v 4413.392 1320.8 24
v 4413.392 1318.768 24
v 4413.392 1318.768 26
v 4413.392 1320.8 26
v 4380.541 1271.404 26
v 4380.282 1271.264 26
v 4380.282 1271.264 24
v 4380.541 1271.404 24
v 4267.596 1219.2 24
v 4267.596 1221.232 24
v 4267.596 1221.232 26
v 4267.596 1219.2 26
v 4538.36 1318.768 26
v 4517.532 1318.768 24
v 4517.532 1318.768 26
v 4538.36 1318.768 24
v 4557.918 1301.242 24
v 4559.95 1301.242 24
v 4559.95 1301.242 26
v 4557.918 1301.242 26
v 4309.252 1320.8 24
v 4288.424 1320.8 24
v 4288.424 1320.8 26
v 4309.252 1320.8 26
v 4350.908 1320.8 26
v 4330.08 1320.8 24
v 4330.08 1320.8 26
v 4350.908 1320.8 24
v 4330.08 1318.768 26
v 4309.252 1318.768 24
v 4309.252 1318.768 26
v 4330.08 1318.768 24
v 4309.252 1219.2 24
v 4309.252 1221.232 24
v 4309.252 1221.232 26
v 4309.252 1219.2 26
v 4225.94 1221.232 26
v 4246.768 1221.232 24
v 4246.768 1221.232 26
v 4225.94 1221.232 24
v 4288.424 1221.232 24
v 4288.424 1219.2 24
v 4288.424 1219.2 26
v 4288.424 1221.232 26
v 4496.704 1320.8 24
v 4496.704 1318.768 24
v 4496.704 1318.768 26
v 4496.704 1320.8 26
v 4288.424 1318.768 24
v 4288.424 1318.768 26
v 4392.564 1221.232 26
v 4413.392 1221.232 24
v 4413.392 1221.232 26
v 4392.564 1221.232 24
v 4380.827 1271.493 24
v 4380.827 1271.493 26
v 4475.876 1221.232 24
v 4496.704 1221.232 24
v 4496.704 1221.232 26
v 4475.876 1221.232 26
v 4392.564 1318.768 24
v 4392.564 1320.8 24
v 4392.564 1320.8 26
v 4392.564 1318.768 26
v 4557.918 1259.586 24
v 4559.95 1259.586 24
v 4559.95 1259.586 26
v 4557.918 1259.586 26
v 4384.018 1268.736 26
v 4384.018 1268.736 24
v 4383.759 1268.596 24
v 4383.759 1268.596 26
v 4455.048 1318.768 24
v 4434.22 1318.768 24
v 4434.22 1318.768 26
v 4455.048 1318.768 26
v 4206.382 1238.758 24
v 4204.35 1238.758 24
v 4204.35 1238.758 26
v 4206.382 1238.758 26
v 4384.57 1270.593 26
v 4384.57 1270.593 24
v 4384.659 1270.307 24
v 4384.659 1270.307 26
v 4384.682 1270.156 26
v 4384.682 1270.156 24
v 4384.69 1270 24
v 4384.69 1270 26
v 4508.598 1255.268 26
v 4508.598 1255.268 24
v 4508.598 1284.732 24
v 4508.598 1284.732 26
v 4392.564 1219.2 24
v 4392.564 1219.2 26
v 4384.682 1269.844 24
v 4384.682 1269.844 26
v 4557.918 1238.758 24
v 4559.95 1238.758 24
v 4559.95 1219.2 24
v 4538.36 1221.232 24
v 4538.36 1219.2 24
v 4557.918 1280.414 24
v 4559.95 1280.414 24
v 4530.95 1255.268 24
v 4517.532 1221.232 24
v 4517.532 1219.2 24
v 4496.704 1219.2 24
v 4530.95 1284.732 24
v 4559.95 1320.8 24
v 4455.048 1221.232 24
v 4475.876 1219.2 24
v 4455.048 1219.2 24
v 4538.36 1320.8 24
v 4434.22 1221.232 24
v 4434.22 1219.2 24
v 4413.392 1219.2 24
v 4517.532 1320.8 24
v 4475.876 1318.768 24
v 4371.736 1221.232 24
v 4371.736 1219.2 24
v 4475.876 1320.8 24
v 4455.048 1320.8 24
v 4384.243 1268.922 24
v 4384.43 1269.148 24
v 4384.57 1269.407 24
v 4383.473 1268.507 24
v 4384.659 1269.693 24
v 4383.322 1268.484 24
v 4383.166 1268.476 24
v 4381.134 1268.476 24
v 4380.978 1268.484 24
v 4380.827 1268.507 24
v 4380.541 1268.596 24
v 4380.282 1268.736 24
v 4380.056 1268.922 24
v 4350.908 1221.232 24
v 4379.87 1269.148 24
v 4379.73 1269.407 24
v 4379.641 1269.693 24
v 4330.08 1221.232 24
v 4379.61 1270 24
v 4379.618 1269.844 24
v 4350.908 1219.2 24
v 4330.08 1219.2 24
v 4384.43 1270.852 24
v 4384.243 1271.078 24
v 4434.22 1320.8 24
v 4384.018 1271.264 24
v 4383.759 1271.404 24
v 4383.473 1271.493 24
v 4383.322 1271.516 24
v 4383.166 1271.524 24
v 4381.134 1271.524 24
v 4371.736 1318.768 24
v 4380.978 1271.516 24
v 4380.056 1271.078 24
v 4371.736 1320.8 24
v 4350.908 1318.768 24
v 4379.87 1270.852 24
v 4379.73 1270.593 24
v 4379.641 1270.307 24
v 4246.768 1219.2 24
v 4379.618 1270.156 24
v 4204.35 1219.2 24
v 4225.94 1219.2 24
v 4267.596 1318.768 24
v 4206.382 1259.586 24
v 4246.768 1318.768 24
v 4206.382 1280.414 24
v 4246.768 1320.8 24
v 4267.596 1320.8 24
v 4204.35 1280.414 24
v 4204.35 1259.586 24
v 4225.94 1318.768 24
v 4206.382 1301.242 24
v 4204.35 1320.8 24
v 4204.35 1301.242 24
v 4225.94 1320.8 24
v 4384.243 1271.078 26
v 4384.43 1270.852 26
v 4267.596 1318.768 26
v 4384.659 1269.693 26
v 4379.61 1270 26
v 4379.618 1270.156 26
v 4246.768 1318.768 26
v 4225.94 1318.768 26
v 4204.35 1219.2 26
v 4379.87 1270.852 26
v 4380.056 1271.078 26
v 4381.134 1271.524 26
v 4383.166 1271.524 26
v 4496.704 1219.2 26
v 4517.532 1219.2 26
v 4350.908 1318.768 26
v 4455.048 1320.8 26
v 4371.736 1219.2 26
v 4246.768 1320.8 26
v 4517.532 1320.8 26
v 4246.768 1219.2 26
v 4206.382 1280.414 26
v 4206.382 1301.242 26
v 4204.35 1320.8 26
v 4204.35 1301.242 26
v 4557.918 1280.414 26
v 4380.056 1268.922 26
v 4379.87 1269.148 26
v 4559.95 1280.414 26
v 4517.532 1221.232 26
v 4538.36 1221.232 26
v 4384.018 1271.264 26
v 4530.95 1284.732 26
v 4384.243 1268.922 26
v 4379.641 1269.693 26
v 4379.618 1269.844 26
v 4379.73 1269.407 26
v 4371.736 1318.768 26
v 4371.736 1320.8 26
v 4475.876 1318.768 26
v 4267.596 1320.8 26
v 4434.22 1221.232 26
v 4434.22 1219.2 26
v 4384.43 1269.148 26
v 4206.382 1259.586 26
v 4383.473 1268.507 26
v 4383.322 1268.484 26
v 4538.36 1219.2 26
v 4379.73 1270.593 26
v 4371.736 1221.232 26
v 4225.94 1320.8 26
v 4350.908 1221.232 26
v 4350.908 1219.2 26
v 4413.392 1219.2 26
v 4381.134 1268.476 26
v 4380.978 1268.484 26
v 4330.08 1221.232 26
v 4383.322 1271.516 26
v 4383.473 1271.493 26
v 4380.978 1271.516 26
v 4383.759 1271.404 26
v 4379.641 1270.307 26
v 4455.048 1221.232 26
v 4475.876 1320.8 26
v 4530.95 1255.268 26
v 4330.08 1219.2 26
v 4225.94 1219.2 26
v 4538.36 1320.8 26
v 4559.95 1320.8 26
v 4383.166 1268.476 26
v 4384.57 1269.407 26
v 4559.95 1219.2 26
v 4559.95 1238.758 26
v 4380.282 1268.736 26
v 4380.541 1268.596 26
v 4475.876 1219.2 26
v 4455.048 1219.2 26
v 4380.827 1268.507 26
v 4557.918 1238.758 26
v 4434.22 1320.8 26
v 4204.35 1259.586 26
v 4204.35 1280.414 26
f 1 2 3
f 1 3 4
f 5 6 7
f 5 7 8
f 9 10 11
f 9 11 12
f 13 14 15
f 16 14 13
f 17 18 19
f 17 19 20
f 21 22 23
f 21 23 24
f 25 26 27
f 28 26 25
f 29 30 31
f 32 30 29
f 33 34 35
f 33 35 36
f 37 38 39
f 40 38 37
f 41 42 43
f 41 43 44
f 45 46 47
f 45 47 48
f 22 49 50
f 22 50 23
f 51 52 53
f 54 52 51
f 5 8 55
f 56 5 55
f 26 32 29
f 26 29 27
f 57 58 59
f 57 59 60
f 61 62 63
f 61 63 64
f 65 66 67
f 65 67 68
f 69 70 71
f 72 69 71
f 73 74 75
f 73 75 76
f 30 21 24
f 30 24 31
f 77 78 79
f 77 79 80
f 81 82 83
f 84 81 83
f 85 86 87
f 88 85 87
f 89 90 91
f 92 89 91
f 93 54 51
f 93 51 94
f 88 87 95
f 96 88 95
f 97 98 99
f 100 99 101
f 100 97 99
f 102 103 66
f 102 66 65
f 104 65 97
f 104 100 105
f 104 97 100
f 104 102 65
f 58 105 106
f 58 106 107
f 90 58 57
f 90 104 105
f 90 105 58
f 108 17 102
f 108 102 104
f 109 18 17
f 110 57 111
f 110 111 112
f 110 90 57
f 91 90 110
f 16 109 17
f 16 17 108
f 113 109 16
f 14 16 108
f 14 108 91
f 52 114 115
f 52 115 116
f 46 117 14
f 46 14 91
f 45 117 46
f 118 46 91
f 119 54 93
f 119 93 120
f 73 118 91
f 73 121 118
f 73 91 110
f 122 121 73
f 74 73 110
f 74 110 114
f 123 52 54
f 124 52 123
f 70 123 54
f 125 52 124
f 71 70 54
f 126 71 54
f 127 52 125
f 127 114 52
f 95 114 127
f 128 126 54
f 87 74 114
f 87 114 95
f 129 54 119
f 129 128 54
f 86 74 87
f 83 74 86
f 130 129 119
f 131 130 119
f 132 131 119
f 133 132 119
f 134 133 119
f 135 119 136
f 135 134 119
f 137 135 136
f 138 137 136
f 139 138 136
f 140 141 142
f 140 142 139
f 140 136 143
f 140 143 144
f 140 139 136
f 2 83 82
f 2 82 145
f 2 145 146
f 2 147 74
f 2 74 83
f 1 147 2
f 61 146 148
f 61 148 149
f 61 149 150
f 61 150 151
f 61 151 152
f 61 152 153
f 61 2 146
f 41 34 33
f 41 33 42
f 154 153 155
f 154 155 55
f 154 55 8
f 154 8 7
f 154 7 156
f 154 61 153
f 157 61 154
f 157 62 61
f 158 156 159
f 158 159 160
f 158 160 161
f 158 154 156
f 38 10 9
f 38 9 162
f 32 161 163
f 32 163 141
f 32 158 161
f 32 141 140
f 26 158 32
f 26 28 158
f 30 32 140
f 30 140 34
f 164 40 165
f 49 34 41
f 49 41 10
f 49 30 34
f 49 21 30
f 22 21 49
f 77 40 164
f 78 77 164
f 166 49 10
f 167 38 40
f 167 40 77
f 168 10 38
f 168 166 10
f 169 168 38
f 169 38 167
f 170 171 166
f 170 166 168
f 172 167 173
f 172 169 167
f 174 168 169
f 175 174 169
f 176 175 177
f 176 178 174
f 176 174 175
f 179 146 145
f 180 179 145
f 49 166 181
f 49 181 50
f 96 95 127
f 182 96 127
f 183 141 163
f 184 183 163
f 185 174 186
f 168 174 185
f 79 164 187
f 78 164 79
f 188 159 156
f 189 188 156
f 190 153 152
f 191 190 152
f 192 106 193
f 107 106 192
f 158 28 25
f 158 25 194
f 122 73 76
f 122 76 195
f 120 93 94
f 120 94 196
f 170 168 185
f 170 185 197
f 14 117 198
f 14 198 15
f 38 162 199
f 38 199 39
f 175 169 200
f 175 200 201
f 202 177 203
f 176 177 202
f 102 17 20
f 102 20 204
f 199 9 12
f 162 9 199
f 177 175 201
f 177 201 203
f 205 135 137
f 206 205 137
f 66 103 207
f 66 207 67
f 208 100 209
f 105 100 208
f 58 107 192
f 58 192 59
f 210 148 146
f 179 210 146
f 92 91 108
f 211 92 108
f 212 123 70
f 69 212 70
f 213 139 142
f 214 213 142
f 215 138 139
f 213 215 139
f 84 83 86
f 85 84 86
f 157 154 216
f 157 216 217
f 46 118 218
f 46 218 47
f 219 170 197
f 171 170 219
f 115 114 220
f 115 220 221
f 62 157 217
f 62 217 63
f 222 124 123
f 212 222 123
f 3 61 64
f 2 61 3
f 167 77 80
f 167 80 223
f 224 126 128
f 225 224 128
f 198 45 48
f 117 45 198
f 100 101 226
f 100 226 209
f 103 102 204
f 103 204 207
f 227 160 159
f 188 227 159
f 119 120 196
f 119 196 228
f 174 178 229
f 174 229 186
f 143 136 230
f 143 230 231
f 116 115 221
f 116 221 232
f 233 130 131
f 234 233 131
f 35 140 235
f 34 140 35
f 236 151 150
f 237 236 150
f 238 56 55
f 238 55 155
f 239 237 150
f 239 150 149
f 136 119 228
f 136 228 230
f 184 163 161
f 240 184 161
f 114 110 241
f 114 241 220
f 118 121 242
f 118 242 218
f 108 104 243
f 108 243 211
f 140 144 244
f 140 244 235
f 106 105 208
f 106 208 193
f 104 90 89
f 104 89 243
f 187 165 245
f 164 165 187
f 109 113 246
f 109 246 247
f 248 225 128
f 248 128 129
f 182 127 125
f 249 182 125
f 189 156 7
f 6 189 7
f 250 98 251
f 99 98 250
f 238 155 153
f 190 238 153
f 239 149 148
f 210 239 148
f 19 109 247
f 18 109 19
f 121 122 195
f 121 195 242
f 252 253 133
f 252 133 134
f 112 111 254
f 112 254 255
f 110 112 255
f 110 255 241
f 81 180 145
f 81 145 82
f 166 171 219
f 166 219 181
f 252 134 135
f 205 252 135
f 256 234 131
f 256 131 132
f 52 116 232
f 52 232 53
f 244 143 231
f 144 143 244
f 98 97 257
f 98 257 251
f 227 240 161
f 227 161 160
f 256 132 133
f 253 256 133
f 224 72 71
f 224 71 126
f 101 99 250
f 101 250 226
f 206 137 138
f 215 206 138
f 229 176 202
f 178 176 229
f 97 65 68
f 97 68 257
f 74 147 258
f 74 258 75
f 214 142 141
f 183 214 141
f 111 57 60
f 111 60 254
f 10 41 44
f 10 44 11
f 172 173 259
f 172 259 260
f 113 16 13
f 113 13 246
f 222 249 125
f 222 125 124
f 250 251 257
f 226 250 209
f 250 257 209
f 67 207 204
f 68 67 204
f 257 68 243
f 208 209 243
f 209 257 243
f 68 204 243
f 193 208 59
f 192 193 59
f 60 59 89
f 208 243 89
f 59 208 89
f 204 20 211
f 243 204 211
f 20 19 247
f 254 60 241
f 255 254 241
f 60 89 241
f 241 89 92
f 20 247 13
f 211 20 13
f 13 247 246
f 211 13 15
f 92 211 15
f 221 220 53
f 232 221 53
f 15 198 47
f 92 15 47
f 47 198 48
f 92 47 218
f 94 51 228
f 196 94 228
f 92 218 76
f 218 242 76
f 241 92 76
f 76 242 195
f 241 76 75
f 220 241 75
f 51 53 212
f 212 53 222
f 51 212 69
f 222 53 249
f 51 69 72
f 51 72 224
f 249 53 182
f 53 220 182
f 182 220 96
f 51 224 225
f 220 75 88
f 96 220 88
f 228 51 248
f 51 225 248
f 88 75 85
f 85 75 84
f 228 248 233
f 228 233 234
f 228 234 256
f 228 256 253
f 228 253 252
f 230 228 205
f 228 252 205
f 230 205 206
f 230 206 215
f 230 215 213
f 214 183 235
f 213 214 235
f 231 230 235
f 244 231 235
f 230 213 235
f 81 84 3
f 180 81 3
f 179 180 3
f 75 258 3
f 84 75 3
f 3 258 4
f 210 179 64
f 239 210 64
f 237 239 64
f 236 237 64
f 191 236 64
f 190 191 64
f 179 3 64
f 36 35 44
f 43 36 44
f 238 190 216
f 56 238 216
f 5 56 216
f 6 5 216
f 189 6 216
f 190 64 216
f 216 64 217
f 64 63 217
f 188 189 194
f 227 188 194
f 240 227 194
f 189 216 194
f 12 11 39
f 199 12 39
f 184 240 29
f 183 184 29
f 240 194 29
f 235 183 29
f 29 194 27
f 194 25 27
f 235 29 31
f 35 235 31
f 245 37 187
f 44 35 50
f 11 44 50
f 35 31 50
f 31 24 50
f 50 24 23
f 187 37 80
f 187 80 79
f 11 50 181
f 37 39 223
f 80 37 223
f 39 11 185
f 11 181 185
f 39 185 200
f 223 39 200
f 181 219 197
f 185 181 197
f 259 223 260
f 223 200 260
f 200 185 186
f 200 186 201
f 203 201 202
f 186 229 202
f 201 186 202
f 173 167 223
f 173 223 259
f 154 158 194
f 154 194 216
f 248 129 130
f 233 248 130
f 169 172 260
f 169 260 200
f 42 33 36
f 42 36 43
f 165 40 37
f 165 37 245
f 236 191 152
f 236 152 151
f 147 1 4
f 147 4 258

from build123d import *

# Parameters (mm, degrees)
SKETCH1_W           = 558.8
SKETCH1_H           = 736.6
BOSS_EXTRUDE1_DEPTH = 50
SCALE1_SCALE        = 0.04


with BuildPart() as part:
    # Sketch1 → Boss-Extrude1 (new body)
    with BuildSketch(Plane.XY):
        Polygon((4705.35, 2489.2), (5226.05, 2489.2), (5226.05, 2540), (5746.75, 2540), (5746.75, 2489.2), (6267.45, 2489.2), (6267.45, 2540), (6788.15, 2540), (6788.15, 2489.2), (7308.85, 2489.2), (7308.85, 2540), (7829.55, 2540), (7829.55, 2489.2), (8350.25, 2489.2), (8350.25, 2540), (8890, 2540), (8890, 2051.05), (8839.2, 2051.05), (8839.2, 1530.35), (8890, 1530.35), (8890, 1009.65), (8839.2, 1009.65), (8839.2, 488.95), (8890, 488.95), (8890, 0), (8350.25, 0), (8350.25, 50.8), (7829.55, 50.8), (7829.55, 0), (7308.85, 0), (7308.85, 50.8), (6788.15, 50.8), (6788.15, 0), (6267.45, 0), (6267.45, 50.8), (5746.75, 50.8), (5746.75, 0), (5226.05, 0), (5226.05, 50.8), (4705.35, 50.8), (4705.35, 0), (4184.65, 0), (4184.65, 50.8), (3663.95, 50.8), (3663.95, 0), (3143.25, 0), (3143.25, 50.8), (2622.55, 50.8), (2622.55, 0), (2101.85, 0), (2101.85, 50.8), (1581.15, 50.8), (1581.15, 0), (1060.45, 0), (1060.45, 50.8), (539.75, 50.8), (539.75, 0), (0, 0), (0, 488.95), (50.8, 488.95), (50.8, 1009.65), (0, 1009.65), (0, 1530.35), (50.8, 1530.35), (50.8, 2051.05), (0, 2051.05), (0, 2540), (539.75, 2540), (539.75, 2489.2), (1060.45, 2489.2), (1060.45, 2540), (1581.15, 2540), (1581.15, 2489.2), (2101.85, 2489.2), (2101.85, 2540), (2622.55, 2540), (2622.55, 2489.2), (3143.25, 2489.2), (3143.25, 2540), (3663.95, 2540), (3663.95, 2489.2), (4184.65, 2489.2), (4184.65, 2540), (4705.35, 2540), align=None)
        Polygon((4470.4, 1231.9), (4419.6, 1231.9), (4415.704496234, 1232.096705982), (4411.921521072, 1232.674056618), (4404.769760674, 1234.894086722), (4398.297927796, 1238.406881576), (4392.659231682, 1243.059231682), (4388.006881576, 1248.697927542), (4384.494086976, 1255.16976042), (4382.274056618, 1262.321521072), (4381.696705982, 1266.104496234), (4381.5, 1270), (4381.696705982, 1273.895503512), (4382.274056618, 1277.678478928), (4384.494086976, 1284.830239326), (4388.006881576, 1291.302072204), (4392.659231682, 1296.940768318), (4398.297927796, 1301.593118424), (4404.769760674, 1305.105913024), (4411.921521072, 1307.325943382), (4415.704496234, 1307.903294018), (4419.6, 1308.1), (4470.4, 1308.1), (4474.295503766, 1307.903294018), (4478.078478928, 1307.325943382), (4485.230239326, 1305.105913024), (4491.702072204, 1301.593118424), (4497.340768318, 1296.940768318), (4501.993118424, 1291.302072204), (4505.505913024, 1284.830239326), (4507.725943382, 1277.678478928), (4508.303294018, 1273.895503512), (4508.5, 1270), (4508.303294018, 1266.104496234), (4507.725943382, 1262.321521072), (4505.505913024, 1255.16976042), (4501.993118424, 1248.697927542), (4497.340768318, 1243.059231682), (4491.702072204, 1238.406881576), (4485.230239326, 1234.894086722), (4478.078478928, 1232.674056618), (4474.295503766, 1232.096705982), align=None, mode=Mode.SUBTRACT)
        with Locations((7885.605536606, 1270)):
            Rectangle(SKETCH1_W, SKETCH1_H, mode=Mode.SUBTRACT)
    extrude(amount=BOSS_EXTRUDE1_DEPTH)


with BuildPart() as part_1:
    # Scale1: scaled about (4379.531045071, 1270, 25)
    add(part.part.scale(SCALE1_SCALE).moved(Location((4204.349803268, 1219.2, 24))))


solid = part_1.part
